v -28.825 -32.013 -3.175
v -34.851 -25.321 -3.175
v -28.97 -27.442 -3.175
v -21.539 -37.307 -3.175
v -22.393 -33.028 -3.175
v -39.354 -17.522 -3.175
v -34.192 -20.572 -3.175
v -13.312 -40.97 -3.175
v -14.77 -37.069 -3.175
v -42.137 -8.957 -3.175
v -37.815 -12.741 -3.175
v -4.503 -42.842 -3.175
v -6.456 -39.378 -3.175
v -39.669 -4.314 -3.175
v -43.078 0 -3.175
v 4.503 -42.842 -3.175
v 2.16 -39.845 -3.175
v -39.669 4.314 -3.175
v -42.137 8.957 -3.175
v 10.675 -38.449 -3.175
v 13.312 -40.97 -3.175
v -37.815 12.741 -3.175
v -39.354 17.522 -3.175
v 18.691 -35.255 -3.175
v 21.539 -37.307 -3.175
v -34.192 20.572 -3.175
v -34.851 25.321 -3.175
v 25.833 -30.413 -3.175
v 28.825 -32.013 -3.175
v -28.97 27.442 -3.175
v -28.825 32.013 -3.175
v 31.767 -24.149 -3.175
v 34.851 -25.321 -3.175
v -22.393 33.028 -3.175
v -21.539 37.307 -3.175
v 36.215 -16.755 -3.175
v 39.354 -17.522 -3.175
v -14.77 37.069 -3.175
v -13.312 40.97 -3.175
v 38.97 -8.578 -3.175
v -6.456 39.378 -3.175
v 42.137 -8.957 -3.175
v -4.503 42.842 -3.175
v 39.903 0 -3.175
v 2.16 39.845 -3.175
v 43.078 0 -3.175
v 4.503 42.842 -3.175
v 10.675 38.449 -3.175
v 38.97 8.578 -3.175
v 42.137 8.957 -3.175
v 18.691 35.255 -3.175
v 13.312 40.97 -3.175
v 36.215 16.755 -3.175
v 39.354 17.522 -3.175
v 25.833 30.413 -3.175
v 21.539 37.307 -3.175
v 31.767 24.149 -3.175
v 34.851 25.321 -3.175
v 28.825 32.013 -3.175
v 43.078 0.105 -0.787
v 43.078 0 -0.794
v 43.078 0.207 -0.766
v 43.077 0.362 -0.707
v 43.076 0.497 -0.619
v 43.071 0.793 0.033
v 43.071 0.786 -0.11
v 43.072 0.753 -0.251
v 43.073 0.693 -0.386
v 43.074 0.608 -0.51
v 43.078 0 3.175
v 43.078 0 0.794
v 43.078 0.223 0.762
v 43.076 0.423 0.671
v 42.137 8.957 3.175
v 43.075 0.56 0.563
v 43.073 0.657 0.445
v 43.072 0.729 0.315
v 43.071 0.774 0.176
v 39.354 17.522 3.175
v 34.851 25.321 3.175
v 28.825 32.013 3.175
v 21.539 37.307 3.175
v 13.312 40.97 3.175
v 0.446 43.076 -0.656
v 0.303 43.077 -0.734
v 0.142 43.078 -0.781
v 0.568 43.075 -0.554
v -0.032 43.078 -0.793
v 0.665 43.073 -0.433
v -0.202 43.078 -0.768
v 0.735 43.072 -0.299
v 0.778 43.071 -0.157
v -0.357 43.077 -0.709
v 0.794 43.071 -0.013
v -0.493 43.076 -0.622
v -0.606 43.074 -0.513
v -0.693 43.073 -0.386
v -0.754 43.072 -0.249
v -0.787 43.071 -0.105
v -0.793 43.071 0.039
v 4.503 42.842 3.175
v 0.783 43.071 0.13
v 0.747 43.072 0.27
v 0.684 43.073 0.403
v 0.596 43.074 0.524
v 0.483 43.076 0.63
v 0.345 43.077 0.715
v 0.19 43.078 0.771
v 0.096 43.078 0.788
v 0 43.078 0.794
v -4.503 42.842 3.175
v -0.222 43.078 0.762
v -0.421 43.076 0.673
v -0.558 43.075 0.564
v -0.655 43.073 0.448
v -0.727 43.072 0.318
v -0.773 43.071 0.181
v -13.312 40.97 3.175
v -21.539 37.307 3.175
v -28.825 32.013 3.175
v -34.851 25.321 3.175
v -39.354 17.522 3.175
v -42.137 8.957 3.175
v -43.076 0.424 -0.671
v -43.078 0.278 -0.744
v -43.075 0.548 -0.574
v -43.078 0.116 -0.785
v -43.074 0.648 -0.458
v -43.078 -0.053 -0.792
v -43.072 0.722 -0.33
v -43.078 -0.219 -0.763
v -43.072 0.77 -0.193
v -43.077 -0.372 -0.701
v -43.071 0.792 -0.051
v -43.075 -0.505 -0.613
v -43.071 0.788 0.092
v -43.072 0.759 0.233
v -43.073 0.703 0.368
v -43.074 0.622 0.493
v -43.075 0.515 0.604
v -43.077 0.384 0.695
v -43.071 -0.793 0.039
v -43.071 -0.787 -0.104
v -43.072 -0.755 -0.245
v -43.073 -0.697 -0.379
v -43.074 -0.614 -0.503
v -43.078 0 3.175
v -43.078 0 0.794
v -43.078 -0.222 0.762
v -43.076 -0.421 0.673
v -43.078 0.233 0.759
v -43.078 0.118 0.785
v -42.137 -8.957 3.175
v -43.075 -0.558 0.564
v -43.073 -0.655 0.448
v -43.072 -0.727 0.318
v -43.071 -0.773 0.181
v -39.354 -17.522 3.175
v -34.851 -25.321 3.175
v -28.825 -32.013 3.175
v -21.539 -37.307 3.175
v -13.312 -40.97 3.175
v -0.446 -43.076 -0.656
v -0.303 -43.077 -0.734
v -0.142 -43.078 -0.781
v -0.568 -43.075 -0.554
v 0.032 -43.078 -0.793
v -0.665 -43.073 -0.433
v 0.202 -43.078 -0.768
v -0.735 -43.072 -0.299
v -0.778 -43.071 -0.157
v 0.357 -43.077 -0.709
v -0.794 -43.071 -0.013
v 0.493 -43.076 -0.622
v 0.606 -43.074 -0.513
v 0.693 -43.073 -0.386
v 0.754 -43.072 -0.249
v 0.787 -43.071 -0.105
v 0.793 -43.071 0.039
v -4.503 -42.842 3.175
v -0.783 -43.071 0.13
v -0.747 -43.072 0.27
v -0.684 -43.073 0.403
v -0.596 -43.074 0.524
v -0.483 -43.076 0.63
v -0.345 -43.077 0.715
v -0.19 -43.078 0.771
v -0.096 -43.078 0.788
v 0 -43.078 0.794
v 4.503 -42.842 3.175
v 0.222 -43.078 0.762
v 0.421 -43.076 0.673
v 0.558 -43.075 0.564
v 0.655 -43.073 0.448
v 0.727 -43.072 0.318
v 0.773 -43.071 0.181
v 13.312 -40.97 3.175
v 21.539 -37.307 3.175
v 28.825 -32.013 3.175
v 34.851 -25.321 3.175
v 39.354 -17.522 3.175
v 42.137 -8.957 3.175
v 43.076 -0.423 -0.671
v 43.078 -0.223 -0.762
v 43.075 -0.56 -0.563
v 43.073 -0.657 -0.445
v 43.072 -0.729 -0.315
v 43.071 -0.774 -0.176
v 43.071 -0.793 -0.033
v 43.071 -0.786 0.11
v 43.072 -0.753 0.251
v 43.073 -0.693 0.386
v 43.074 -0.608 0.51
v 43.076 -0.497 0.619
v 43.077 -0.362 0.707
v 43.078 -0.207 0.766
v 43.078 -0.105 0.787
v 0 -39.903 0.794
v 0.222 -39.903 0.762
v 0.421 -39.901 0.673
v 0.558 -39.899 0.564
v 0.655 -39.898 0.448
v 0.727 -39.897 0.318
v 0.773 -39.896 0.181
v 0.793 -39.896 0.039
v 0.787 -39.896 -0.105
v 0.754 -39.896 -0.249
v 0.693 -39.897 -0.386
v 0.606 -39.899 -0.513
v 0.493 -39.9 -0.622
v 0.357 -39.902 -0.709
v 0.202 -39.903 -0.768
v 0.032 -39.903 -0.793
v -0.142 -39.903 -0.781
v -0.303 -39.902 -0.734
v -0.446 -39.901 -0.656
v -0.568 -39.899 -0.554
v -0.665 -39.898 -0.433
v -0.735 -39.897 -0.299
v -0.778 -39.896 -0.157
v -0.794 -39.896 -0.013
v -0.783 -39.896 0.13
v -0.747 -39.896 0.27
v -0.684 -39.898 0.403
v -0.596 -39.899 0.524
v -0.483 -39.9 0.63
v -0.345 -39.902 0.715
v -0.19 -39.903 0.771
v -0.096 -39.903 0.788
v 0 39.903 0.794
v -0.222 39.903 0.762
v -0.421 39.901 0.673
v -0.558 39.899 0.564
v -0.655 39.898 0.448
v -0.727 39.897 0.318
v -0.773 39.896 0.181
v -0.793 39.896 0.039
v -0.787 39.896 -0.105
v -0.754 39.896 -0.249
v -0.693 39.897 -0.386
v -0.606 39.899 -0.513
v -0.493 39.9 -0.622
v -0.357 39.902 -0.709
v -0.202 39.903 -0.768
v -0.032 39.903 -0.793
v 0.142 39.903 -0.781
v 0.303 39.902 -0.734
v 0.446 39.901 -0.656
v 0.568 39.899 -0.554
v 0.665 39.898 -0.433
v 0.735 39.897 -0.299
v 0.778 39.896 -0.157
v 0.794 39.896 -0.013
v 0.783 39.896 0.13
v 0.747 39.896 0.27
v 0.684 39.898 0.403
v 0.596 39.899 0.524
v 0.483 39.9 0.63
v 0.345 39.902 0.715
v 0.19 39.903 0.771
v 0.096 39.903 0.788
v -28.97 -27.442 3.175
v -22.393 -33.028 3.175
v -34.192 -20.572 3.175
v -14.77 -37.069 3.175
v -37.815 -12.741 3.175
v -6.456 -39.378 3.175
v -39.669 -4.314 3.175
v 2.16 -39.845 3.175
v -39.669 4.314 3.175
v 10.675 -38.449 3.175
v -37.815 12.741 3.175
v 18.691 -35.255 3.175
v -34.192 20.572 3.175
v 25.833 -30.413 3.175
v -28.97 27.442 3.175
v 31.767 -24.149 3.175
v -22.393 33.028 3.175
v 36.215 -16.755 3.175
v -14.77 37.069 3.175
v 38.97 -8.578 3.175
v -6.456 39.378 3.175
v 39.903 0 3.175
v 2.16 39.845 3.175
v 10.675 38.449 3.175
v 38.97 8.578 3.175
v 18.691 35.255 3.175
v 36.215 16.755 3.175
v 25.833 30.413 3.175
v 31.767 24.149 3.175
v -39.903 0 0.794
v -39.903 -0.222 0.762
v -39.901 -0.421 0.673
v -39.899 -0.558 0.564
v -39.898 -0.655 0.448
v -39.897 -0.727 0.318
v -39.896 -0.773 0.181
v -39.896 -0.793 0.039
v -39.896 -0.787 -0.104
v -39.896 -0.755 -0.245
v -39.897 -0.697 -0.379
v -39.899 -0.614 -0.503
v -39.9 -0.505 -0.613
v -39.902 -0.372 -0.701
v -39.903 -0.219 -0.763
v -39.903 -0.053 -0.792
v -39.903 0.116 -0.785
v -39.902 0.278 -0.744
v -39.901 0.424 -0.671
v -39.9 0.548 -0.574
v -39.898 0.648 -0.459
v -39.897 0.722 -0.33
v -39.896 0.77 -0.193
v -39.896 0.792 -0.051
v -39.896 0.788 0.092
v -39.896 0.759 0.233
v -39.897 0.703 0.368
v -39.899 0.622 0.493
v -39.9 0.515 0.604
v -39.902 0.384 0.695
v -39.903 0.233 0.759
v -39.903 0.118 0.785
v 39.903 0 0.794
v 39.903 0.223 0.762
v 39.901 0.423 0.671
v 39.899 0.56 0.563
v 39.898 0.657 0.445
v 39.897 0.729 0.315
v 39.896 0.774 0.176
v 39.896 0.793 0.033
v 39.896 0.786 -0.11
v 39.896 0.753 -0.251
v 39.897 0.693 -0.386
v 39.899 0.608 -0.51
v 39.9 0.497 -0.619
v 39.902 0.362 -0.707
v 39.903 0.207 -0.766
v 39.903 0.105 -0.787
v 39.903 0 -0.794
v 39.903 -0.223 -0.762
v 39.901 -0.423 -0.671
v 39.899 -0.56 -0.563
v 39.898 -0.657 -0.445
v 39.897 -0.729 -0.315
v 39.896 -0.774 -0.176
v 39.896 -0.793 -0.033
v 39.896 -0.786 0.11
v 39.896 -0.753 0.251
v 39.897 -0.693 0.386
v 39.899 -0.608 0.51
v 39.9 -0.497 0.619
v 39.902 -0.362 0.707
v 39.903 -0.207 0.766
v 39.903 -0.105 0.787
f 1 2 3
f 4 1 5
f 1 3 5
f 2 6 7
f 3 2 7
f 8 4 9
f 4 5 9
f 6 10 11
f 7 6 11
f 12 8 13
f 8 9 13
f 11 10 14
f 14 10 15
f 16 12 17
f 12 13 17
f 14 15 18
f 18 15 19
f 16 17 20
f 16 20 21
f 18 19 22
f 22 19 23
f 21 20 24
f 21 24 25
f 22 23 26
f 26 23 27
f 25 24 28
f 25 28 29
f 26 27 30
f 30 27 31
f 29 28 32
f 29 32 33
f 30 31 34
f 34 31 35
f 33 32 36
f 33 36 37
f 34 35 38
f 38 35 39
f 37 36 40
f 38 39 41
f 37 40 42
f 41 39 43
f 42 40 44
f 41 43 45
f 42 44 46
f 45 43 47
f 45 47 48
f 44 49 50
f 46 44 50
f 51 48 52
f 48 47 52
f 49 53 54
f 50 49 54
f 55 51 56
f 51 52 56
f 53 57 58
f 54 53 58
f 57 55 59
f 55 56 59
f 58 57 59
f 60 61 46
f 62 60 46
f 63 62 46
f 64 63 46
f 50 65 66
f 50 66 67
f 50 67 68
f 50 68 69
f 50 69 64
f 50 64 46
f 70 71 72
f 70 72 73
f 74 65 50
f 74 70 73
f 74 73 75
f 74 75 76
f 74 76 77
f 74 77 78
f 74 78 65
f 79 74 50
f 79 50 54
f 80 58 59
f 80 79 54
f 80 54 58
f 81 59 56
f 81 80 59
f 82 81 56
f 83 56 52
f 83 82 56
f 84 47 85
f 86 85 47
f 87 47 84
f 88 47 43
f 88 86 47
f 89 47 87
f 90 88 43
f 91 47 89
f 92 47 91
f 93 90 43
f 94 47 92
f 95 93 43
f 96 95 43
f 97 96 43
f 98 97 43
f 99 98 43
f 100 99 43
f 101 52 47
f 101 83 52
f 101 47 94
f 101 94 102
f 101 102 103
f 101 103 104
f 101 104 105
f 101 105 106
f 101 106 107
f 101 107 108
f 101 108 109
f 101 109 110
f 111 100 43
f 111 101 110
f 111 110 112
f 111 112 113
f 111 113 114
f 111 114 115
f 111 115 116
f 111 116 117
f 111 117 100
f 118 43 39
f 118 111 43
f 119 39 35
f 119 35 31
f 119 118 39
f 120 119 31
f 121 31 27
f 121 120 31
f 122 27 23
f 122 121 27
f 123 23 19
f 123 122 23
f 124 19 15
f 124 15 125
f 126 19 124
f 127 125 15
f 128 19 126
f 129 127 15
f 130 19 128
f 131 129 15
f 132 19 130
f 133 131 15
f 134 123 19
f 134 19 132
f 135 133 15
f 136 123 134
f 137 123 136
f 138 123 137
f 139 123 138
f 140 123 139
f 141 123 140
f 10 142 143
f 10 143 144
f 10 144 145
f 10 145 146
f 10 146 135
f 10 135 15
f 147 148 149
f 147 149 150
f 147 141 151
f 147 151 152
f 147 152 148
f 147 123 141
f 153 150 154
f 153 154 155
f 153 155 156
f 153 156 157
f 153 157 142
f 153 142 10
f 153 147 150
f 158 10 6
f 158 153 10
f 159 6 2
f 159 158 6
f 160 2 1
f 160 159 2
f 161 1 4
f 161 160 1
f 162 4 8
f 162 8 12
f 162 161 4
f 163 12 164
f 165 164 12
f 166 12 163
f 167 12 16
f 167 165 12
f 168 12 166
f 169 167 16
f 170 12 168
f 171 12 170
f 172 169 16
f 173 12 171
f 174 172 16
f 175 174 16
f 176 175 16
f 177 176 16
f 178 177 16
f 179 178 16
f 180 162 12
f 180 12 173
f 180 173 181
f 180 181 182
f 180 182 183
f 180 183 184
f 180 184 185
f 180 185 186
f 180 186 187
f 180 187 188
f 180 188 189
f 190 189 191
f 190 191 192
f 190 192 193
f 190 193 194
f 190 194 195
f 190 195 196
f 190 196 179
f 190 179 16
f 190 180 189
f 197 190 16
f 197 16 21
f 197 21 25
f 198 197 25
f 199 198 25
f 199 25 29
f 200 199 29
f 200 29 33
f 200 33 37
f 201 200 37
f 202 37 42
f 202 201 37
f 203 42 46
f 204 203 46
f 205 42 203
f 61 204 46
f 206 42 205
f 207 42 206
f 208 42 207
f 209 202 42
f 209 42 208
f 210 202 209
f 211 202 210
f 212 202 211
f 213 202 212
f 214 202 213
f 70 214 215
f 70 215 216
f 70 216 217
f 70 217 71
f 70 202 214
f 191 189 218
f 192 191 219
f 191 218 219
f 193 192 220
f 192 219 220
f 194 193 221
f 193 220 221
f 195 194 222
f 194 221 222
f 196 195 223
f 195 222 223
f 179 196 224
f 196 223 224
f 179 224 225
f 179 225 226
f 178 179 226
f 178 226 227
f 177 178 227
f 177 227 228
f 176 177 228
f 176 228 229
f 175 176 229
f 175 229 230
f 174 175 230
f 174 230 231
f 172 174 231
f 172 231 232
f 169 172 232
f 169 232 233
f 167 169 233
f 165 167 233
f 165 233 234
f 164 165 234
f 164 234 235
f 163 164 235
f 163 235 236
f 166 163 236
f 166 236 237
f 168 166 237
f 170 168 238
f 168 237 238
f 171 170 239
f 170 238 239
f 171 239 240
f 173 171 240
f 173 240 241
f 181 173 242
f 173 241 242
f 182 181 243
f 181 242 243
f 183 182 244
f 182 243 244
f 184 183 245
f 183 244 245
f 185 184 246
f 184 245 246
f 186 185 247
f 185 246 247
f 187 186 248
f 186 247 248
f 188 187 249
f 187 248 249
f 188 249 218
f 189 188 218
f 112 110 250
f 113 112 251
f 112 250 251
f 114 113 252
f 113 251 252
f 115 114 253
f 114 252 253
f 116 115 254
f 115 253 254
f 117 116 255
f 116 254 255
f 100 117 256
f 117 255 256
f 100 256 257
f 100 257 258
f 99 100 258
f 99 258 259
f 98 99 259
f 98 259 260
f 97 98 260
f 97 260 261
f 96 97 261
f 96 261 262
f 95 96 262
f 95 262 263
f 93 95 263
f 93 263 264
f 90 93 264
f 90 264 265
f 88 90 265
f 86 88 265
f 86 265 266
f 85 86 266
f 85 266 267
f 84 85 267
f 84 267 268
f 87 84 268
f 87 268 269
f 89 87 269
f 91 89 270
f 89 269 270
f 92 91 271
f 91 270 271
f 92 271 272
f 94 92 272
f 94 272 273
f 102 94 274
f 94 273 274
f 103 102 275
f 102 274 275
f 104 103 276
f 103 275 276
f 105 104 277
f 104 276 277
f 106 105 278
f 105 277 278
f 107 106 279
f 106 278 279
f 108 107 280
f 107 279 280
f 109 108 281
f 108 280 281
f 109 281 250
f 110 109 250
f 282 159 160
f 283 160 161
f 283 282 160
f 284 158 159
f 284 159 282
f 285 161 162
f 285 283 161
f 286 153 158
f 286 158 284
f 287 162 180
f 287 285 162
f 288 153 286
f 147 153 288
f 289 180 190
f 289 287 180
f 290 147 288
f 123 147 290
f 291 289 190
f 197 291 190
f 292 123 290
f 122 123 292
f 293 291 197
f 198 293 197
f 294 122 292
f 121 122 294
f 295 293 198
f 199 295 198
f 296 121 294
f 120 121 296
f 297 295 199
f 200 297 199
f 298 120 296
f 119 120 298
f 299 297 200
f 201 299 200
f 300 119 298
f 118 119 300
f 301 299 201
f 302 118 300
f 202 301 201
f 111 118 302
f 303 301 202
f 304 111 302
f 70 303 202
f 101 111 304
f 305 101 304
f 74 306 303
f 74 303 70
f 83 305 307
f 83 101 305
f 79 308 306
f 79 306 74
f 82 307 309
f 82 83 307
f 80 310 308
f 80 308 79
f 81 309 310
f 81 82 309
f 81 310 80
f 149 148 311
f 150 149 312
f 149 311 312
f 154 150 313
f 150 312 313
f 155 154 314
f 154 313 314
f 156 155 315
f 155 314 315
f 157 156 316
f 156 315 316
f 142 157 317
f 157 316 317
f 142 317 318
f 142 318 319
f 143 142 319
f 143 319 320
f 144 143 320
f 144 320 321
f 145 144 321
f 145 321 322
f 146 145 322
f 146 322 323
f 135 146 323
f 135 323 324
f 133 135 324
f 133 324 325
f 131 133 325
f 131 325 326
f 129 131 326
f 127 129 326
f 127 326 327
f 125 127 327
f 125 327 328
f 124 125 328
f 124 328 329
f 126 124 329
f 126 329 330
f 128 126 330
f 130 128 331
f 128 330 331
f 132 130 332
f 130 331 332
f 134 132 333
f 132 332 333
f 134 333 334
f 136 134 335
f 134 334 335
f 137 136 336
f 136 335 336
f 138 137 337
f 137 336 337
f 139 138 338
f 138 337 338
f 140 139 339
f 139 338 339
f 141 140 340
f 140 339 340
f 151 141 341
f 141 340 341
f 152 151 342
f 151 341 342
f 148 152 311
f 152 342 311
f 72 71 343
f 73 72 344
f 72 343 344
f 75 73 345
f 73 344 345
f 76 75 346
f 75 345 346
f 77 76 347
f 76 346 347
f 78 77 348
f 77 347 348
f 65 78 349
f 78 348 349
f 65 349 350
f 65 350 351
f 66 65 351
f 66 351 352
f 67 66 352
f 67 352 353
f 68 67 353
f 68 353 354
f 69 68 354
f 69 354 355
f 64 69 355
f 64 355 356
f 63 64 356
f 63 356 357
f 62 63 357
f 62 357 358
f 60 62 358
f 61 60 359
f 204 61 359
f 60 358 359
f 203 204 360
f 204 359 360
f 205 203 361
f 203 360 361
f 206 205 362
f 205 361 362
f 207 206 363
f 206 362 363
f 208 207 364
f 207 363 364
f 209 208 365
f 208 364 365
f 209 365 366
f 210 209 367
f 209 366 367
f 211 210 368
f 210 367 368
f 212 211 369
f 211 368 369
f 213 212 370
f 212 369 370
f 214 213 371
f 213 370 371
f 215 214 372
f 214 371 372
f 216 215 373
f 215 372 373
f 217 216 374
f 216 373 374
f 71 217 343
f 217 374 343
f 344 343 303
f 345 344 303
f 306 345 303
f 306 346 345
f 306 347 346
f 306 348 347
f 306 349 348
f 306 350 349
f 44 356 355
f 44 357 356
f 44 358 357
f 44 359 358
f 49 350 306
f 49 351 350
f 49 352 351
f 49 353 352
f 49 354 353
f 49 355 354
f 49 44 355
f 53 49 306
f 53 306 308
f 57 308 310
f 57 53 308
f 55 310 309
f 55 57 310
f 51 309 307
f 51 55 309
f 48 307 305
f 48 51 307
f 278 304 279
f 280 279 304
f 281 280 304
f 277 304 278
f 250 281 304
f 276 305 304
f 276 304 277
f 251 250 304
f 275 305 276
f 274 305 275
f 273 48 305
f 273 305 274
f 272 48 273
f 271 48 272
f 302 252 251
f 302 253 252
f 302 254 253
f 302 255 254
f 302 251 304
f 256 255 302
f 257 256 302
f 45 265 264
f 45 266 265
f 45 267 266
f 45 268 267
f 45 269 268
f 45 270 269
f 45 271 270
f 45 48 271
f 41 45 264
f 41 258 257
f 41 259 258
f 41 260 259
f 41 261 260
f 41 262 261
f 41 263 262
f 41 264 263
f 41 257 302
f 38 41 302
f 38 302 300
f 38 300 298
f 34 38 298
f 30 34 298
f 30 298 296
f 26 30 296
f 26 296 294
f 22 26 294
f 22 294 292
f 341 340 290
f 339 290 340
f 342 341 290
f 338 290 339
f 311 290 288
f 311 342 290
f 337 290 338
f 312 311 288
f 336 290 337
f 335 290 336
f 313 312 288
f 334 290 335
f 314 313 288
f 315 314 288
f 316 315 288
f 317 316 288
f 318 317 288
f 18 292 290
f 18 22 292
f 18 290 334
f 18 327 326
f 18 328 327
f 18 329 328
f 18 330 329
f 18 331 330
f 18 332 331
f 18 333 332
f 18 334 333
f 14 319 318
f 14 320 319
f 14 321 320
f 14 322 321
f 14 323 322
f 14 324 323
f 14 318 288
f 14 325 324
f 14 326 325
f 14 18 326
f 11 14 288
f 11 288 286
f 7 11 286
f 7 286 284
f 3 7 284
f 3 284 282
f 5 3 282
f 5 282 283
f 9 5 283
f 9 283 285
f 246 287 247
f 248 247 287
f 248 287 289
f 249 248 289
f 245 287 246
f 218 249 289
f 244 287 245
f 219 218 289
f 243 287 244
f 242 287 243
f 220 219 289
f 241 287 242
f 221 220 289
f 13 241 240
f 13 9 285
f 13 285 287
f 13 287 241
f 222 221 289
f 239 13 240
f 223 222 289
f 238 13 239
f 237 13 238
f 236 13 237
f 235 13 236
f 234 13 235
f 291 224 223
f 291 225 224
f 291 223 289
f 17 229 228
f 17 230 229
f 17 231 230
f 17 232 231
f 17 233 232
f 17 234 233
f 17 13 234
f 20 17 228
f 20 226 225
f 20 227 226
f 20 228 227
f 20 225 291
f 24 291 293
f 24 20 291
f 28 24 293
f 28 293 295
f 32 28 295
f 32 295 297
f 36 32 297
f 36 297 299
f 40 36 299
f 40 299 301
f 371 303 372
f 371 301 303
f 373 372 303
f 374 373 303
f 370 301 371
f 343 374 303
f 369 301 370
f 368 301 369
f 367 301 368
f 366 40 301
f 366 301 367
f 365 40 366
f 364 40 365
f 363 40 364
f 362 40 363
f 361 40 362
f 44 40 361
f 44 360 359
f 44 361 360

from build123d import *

# Parameters (mm, degrees)
SKETCH3_R           = 43.0784
SKETCH3_R_2         = 39.9034
BOSS_EXTRUDE1_DEPTH = 3.175
SKETCH4_R           = 0.79375
CUT_EXTRUDE1_DEPTH  = 62.004735211
CIRPATTERN1_COUNT   = 4


with BuildPart() as part:
    # Sketch3 → Boss-Extrude1 (new, symmetric)
    with BuildSketch(Plane.XY):
        Circle(SKETCH3_R)
        Circle(SKETCH3_R_2, mode=Mode.SUBTRACT)
    extrude(amount=BOSS_EXTRUDE1_DEPTH, both=True)

    # Sketch4 → Cut-Extrude1 (cut, through all)
    with BuildSketch(Plane(origin=(0, 0, 0), x_dir=(1, 0, 0), z_dir=(0, 1, 0))):
        with Locations(Location((0, 0, 0), (0, 0, 270))):
            Circle(SKETCH4_R)
    cut_extrude1 = extrude(amount=-CUT_EXTRUDE1_DEPTH, mode=Mode.SUBTRACT)

    # CirPattern1: Cut-Extrude1 ×4 about axis
    cirpattern1_axis = Axis((0, 0, 3.175), (0, 0, -1))
    for i in range(1, CIRPATTERN1_COUNT):
        add(cut_extrude1.rotate(cirpattern1_axis, i * 360 / CIRPATTERN1_COUNT), mode=Mode.SUBTRACT)


solid = part.part
